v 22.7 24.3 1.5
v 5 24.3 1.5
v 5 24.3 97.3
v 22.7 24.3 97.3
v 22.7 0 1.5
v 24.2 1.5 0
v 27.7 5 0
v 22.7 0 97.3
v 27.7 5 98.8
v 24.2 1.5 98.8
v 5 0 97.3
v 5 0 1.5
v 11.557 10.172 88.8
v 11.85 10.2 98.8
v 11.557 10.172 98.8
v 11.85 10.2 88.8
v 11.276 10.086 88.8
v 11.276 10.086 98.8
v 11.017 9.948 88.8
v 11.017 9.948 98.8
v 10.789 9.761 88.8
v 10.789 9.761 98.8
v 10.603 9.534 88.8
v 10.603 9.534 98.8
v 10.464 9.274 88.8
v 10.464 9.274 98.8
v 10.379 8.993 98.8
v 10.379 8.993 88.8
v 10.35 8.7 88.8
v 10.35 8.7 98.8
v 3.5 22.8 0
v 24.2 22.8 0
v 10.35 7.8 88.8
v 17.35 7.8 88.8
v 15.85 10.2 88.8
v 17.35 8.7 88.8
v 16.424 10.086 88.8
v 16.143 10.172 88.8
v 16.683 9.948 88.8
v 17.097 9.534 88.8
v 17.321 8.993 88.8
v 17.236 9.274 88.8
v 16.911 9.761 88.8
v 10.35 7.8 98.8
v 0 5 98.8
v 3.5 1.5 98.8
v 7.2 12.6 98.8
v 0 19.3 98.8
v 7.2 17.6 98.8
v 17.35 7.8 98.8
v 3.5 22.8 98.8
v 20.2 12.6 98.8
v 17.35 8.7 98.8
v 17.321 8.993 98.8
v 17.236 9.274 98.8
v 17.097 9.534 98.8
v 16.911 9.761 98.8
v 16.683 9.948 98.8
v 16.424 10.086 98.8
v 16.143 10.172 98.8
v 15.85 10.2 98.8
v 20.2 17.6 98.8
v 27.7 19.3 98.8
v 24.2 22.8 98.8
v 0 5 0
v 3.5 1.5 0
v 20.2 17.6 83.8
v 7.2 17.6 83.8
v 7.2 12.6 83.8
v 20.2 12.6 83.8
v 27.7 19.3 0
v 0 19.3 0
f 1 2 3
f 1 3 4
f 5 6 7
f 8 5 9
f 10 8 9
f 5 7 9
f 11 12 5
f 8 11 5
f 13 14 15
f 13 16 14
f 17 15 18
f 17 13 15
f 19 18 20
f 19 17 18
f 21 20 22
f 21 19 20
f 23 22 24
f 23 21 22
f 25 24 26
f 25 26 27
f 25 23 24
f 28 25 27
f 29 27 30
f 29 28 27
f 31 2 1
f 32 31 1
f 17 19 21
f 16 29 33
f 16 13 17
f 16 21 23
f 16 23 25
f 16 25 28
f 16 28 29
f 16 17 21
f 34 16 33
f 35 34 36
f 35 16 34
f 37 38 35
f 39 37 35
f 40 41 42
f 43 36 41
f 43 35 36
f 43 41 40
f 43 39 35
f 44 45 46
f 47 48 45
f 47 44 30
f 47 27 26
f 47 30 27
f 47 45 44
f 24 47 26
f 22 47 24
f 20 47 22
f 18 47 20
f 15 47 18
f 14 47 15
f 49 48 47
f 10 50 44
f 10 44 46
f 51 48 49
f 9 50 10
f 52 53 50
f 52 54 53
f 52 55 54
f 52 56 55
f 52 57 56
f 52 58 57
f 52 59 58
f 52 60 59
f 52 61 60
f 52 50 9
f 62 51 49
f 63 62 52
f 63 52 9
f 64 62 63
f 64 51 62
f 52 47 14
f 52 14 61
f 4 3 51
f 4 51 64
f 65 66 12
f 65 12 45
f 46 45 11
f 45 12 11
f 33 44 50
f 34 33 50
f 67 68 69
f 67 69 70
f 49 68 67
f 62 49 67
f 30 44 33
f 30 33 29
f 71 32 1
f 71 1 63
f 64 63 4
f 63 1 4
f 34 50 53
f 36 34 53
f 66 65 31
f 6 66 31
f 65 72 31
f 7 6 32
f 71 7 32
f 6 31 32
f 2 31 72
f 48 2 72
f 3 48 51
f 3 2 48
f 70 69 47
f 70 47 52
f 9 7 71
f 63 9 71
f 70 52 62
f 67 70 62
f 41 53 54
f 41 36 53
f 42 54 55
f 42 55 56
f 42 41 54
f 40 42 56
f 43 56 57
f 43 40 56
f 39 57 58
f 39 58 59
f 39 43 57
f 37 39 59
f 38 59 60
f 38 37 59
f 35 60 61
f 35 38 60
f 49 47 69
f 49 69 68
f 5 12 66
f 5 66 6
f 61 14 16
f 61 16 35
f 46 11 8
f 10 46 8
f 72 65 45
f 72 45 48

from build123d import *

# Parameters (mm, degrees)
SKETCH1_W           = 27.7
SKETCH1_H           = 24.3
BOSS_EXTRUDE1_DEPTH = 98.8
CHAMFER1_SIZE       = 5
CHAMFER2_SIZE       = 1.5
SKETCH2_W           = 13
SKETCH2_H           = 5
CUT_EXTRUDE1_DEPTH  = 15
SKETCH3_W           = 7
SKETCH3_H           = 2.4
CUT_EXTRUDE3_DEPTH  = 10
FILLET1_R           = 1.5


with BuildPart() as part:
    # Sketch1 → Boss-Extrude1 (new body)
    with BuildSketch(Plane.XY):
        with Locations((13.85, 12.15)):
            Rectangle(SKETCH1_W, SKETCH1_H)
    extrude(amount=BOSS_EXTRUDE1_DEPTH)

    # Chamfer1
    chamfer1_edges = [part.edges().sort_by_distance(p)[0] for p in [
        (0, 24.3, 49.4),
        (27.7, 24.3, 49.4),
        (27.7, 0, 49.4),
        (0, 0, 49.4),
    ]]
    chamfer(chamfer1_edges, length=CHAMFER1_SIZE)

    # Chamfer2
    chamfer2_edges = [part.edges().sort_by_distance(p)[0] for p in [
        (13.85, 24.3, 0),
        (13.85, 0, 0),
        (13.85, 24.3, 98.8),
        (13.85, 0, 98.8),
    ]]
    chamfer(chamfer2_edges, length=CHAMFER2_SIZE)

    # Sketch2 → Cut-Extrude1 (cut)
    with BuildSketch(Plane.XY.offset(98.8)):
        with Locations((13.7, 15.100435324)):
            Rectangle(SKETCH2_W, SKETCH2_H)
    extrude(amount=-CUT_EXTRUDE1_DEPTH, mode=Mode.SUBTRACT)

    # Sketch3 → Cut-Extrude3 (cut)
    with BuildSketch(Plane.XY.offset(98.8)):
        with Locations((13.85, 9.000435324)):
            Rectangle(SKETCH3_W, SKETCH3_H)
    extrude(amount=-CUT_EXTRUDE3_DEPTH, mode=Mode.SUBTRACT)

    # Fillet1
    fillet1_edges = [part.edges().sort_by_distance(p)[0] for p in [
        (10.35, 10.200435324, 93.8),
        (17.35, 10.200435324, 93.8),
    ]]
    fillet(fillet1_edges, radius=FILLET1_R)


solid = part.part
